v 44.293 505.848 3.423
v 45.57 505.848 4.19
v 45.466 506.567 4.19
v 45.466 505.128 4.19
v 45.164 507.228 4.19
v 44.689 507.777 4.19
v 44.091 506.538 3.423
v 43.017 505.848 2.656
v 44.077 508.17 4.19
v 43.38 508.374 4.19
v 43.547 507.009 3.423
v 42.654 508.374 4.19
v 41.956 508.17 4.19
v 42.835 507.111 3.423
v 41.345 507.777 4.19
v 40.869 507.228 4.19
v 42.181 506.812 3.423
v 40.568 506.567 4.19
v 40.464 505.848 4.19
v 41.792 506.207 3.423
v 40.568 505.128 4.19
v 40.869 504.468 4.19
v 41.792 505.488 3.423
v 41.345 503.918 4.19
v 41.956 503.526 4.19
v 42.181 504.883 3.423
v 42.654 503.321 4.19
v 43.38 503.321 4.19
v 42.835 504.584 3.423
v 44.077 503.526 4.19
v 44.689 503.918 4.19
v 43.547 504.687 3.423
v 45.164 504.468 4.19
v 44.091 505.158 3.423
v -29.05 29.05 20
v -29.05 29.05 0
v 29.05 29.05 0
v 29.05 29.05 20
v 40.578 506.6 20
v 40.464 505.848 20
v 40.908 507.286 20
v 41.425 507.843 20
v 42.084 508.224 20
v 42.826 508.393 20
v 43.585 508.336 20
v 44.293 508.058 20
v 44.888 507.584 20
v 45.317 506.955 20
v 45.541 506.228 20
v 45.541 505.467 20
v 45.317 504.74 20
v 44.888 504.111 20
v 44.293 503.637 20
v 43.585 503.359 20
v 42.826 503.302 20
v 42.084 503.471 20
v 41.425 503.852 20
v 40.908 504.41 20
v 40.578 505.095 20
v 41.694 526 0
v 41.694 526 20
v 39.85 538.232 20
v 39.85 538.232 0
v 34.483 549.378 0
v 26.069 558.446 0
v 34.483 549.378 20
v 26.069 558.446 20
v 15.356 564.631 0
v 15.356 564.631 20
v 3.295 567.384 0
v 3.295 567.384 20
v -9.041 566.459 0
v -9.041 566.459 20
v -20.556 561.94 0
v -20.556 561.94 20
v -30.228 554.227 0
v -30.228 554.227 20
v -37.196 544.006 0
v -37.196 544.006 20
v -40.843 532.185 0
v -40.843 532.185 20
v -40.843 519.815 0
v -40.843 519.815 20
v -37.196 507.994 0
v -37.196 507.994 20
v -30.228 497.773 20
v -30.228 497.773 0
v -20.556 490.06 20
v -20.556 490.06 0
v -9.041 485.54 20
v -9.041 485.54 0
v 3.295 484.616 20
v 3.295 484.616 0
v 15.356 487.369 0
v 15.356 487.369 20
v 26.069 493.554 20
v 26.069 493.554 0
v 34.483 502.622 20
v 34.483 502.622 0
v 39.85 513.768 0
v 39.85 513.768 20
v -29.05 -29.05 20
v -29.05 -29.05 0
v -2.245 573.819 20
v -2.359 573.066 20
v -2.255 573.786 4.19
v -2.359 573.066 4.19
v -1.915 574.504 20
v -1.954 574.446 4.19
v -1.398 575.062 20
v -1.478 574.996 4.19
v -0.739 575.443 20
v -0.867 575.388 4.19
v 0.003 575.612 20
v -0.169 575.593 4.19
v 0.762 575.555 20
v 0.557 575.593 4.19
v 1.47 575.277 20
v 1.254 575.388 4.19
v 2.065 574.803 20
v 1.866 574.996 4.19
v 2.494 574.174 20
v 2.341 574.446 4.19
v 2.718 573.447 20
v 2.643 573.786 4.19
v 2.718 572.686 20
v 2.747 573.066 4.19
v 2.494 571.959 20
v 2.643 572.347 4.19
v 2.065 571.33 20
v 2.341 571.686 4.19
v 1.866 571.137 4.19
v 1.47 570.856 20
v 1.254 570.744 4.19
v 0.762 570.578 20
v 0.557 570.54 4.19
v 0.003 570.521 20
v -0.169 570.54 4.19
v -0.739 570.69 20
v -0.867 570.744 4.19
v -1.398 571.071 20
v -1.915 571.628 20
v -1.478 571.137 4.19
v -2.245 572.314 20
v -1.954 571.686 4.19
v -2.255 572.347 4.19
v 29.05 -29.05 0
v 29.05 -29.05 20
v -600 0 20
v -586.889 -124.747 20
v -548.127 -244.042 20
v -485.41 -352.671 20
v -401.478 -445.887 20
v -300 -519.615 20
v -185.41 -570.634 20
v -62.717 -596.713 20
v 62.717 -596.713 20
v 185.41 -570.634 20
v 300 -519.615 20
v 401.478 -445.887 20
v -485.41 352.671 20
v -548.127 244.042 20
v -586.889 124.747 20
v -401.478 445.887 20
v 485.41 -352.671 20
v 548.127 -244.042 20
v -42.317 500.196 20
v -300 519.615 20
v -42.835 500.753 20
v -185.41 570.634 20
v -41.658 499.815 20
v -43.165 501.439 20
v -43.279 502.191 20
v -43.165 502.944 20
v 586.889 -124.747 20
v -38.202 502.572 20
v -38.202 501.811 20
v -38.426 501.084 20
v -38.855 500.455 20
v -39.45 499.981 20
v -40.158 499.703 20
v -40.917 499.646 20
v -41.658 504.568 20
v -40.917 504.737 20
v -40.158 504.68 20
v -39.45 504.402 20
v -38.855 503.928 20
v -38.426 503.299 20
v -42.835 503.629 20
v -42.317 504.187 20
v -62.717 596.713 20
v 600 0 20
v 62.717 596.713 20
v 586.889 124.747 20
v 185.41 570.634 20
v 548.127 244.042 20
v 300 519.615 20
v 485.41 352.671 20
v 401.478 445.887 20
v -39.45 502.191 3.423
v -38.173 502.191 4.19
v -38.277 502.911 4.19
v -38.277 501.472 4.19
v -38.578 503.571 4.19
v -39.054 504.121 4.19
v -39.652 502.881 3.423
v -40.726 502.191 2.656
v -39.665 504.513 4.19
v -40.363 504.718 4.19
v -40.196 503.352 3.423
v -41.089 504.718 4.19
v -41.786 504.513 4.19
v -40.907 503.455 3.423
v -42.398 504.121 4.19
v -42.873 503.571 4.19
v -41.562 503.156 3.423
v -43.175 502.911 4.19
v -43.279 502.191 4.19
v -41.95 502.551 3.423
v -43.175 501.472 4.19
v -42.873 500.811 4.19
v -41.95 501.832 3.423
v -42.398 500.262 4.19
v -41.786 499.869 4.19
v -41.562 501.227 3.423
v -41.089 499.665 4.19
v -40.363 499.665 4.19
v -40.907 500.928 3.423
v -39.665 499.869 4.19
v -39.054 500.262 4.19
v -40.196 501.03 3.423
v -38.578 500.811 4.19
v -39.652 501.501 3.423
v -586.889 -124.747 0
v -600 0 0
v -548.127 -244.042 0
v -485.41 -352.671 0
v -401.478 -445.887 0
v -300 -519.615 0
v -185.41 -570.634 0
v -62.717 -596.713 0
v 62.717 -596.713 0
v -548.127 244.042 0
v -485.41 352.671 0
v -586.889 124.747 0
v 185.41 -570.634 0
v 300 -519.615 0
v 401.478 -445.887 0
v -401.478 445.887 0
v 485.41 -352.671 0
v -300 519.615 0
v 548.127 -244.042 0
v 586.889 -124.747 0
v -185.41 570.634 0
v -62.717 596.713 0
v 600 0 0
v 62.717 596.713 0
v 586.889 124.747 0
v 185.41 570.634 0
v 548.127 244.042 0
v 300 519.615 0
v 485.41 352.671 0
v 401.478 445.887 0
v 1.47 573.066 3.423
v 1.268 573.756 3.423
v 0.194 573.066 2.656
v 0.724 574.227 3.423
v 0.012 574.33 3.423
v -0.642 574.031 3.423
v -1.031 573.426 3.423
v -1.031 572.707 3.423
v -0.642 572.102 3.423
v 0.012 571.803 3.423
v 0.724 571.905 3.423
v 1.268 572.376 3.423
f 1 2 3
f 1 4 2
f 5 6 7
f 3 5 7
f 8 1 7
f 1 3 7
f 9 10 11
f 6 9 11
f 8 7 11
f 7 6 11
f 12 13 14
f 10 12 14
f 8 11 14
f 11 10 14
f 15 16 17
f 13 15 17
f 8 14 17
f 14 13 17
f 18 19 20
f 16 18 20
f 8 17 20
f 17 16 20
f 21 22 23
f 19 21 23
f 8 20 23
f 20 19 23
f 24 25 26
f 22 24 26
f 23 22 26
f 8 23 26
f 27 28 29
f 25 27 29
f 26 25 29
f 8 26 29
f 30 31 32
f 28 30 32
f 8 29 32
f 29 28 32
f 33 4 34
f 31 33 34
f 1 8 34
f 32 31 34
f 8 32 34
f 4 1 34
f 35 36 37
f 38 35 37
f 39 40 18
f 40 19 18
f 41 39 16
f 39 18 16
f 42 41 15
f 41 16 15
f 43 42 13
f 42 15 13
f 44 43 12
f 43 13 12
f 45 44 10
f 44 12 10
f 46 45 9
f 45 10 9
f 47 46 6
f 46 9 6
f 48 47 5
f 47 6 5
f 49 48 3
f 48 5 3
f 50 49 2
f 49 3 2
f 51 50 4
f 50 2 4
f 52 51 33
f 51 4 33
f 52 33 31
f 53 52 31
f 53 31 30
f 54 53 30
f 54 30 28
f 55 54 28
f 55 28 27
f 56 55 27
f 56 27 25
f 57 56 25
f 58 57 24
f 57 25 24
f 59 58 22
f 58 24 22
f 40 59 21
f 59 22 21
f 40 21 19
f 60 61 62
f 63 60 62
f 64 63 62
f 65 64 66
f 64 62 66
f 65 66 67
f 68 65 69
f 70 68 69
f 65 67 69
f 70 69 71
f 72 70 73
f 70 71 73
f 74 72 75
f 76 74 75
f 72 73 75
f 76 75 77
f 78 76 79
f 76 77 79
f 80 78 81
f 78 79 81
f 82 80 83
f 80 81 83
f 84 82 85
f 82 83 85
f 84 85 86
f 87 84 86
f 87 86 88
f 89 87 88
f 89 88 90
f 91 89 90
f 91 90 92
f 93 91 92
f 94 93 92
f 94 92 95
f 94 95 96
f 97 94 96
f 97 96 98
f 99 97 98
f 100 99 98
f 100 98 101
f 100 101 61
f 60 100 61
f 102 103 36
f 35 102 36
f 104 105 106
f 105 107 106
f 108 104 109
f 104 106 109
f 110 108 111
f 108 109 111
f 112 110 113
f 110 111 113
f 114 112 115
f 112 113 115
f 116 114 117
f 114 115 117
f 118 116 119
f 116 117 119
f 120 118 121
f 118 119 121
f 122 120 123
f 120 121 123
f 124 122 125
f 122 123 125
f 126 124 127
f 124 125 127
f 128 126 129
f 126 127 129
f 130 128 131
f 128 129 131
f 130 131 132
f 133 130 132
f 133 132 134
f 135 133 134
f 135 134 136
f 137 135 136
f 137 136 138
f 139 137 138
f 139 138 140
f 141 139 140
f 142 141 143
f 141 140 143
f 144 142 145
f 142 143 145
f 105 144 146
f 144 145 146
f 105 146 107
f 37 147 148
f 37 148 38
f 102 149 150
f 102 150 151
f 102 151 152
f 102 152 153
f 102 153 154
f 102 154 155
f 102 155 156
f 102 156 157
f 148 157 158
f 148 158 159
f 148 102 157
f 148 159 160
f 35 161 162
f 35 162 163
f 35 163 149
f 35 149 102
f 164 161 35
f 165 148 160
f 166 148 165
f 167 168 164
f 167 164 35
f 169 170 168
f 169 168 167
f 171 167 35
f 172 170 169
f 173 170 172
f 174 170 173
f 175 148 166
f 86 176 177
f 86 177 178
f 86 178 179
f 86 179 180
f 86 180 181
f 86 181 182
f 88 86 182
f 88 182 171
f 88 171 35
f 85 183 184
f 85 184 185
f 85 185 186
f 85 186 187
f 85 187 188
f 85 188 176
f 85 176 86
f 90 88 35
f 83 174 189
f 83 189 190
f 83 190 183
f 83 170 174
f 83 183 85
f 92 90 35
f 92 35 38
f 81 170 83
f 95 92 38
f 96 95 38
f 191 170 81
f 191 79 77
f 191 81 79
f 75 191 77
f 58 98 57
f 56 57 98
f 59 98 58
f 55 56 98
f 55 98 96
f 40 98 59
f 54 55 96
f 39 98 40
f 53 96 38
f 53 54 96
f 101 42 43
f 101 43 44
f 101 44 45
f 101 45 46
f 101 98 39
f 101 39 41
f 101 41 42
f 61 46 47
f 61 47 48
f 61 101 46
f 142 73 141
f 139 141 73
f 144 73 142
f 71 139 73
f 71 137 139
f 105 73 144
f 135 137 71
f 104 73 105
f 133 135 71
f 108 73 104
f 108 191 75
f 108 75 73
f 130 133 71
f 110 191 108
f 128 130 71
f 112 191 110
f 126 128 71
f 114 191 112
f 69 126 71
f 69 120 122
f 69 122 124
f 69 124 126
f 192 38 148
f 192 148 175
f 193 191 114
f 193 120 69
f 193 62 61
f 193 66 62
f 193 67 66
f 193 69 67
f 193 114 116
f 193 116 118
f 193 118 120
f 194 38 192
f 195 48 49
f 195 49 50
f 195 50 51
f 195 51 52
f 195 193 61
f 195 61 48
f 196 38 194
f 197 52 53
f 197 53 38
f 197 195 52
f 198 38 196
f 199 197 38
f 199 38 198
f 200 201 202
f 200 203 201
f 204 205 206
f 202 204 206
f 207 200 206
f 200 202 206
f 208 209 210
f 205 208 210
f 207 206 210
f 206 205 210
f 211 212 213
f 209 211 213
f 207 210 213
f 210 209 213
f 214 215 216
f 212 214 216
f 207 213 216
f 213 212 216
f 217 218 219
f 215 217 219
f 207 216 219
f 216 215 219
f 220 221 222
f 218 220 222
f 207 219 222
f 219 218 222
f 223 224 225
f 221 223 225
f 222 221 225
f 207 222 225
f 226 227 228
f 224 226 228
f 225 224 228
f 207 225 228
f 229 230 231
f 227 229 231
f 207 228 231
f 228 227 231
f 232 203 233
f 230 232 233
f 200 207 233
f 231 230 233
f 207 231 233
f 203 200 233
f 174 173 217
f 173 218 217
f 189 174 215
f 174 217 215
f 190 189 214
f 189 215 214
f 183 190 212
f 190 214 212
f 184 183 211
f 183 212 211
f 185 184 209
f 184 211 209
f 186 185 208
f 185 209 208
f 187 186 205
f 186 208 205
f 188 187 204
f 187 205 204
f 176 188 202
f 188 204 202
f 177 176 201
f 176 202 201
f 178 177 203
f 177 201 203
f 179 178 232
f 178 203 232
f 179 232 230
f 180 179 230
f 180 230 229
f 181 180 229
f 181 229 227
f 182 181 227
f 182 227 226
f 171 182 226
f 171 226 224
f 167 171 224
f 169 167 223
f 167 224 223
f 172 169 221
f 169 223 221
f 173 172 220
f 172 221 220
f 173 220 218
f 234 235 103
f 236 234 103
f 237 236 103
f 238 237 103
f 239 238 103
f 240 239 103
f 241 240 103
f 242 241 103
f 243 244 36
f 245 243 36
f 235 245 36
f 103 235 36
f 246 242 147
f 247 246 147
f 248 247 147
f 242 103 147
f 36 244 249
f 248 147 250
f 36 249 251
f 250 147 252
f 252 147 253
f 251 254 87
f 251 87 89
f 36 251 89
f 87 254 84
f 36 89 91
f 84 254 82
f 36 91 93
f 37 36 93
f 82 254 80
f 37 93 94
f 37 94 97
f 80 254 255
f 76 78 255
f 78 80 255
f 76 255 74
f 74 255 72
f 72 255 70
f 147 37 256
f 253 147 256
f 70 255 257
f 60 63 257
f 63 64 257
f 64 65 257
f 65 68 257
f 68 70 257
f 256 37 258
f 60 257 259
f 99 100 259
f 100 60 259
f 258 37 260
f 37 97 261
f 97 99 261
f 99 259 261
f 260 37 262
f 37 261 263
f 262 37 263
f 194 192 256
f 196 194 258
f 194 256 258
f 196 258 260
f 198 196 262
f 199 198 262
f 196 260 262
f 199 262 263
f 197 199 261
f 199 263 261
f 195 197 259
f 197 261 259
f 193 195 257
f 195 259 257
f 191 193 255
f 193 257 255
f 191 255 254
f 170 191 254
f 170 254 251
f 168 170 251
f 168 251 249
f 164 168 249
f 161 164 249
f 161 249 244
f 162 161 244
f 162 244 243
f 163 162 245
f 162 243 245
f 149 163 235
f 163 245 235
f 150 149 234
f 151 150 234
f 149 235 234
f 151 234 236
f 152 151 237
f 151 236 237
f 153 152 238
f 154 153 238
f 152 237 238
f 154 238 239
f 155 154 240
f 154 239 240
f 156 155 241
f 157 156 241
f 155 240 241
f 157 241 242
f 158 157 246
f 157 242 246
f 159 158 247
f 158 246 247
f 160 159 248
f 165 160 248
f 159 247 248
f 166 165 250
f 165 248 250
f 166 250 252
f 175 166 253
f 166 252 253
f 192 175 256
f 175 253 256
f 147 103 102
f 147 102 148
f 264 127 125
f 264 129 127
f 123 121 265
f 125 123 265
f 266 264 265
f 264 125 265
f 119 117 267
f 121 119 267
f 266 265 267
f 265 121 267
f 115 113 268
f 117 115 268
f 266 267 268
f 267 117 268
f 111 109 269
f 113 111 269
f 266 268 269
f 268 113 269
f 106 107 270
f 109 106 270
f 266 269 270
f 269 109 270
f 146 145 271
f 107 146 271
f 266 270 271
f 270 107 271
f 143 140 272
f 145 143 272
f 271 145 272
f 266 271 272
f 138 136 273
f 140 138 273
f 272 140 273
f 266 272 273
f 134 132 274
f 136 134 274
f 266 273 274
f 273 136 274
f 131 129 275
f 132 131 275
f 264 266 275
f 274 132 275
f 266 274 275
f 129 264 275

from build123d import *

# Parameters (mm, degrees)
F0_R     = 600
F0_W     = 58.1
F0_H     = 58.1
F1_DEPTH = 20
F3_R     = 41.5
F4_DEPTH = 20.001
F5_D     = 5.1054
F5_DEPTH = 15.81
F5_TIP   = 1.5338169022


with BuildPart() as f1:
    # F0 (on Top) → F1 (new body)
    with BuildSketch(Plane.XY):
        Circle(F0_R)
        Rectangle(F0_W, F0_H, mode=Mode.SUBTRACT)
    extrude(amount=F1_DEPTH)

    # F3 (on offset) → F4 (cut, through all)
    with BuildSketch(Plane.XY.offset(20)):
        with Locations((0.1939173973, 525.9999642548)):
            Circle(F3_R)
    extrude(amount=-F4_DEPTH, mode=Mode.SUBTRACT)

    # F5
    with Locations(Plane.XY.offset(20)):
        with Locations((-40.7258506305, 502.1913310914), (43.0168926358, 505.8476182242), (0.1938496983, 573.0663310914)):
            Hole(F5_D / 2, depth=F5_DEPTH)
            with Locations((0, 0, -(F5_DEPTH + F5_TIP / 2))):  # 118° drill point
                Cone(0, F5_D / 2, F5_TIP, mode=Mode.SUBTRACT)


solid = f1.part
